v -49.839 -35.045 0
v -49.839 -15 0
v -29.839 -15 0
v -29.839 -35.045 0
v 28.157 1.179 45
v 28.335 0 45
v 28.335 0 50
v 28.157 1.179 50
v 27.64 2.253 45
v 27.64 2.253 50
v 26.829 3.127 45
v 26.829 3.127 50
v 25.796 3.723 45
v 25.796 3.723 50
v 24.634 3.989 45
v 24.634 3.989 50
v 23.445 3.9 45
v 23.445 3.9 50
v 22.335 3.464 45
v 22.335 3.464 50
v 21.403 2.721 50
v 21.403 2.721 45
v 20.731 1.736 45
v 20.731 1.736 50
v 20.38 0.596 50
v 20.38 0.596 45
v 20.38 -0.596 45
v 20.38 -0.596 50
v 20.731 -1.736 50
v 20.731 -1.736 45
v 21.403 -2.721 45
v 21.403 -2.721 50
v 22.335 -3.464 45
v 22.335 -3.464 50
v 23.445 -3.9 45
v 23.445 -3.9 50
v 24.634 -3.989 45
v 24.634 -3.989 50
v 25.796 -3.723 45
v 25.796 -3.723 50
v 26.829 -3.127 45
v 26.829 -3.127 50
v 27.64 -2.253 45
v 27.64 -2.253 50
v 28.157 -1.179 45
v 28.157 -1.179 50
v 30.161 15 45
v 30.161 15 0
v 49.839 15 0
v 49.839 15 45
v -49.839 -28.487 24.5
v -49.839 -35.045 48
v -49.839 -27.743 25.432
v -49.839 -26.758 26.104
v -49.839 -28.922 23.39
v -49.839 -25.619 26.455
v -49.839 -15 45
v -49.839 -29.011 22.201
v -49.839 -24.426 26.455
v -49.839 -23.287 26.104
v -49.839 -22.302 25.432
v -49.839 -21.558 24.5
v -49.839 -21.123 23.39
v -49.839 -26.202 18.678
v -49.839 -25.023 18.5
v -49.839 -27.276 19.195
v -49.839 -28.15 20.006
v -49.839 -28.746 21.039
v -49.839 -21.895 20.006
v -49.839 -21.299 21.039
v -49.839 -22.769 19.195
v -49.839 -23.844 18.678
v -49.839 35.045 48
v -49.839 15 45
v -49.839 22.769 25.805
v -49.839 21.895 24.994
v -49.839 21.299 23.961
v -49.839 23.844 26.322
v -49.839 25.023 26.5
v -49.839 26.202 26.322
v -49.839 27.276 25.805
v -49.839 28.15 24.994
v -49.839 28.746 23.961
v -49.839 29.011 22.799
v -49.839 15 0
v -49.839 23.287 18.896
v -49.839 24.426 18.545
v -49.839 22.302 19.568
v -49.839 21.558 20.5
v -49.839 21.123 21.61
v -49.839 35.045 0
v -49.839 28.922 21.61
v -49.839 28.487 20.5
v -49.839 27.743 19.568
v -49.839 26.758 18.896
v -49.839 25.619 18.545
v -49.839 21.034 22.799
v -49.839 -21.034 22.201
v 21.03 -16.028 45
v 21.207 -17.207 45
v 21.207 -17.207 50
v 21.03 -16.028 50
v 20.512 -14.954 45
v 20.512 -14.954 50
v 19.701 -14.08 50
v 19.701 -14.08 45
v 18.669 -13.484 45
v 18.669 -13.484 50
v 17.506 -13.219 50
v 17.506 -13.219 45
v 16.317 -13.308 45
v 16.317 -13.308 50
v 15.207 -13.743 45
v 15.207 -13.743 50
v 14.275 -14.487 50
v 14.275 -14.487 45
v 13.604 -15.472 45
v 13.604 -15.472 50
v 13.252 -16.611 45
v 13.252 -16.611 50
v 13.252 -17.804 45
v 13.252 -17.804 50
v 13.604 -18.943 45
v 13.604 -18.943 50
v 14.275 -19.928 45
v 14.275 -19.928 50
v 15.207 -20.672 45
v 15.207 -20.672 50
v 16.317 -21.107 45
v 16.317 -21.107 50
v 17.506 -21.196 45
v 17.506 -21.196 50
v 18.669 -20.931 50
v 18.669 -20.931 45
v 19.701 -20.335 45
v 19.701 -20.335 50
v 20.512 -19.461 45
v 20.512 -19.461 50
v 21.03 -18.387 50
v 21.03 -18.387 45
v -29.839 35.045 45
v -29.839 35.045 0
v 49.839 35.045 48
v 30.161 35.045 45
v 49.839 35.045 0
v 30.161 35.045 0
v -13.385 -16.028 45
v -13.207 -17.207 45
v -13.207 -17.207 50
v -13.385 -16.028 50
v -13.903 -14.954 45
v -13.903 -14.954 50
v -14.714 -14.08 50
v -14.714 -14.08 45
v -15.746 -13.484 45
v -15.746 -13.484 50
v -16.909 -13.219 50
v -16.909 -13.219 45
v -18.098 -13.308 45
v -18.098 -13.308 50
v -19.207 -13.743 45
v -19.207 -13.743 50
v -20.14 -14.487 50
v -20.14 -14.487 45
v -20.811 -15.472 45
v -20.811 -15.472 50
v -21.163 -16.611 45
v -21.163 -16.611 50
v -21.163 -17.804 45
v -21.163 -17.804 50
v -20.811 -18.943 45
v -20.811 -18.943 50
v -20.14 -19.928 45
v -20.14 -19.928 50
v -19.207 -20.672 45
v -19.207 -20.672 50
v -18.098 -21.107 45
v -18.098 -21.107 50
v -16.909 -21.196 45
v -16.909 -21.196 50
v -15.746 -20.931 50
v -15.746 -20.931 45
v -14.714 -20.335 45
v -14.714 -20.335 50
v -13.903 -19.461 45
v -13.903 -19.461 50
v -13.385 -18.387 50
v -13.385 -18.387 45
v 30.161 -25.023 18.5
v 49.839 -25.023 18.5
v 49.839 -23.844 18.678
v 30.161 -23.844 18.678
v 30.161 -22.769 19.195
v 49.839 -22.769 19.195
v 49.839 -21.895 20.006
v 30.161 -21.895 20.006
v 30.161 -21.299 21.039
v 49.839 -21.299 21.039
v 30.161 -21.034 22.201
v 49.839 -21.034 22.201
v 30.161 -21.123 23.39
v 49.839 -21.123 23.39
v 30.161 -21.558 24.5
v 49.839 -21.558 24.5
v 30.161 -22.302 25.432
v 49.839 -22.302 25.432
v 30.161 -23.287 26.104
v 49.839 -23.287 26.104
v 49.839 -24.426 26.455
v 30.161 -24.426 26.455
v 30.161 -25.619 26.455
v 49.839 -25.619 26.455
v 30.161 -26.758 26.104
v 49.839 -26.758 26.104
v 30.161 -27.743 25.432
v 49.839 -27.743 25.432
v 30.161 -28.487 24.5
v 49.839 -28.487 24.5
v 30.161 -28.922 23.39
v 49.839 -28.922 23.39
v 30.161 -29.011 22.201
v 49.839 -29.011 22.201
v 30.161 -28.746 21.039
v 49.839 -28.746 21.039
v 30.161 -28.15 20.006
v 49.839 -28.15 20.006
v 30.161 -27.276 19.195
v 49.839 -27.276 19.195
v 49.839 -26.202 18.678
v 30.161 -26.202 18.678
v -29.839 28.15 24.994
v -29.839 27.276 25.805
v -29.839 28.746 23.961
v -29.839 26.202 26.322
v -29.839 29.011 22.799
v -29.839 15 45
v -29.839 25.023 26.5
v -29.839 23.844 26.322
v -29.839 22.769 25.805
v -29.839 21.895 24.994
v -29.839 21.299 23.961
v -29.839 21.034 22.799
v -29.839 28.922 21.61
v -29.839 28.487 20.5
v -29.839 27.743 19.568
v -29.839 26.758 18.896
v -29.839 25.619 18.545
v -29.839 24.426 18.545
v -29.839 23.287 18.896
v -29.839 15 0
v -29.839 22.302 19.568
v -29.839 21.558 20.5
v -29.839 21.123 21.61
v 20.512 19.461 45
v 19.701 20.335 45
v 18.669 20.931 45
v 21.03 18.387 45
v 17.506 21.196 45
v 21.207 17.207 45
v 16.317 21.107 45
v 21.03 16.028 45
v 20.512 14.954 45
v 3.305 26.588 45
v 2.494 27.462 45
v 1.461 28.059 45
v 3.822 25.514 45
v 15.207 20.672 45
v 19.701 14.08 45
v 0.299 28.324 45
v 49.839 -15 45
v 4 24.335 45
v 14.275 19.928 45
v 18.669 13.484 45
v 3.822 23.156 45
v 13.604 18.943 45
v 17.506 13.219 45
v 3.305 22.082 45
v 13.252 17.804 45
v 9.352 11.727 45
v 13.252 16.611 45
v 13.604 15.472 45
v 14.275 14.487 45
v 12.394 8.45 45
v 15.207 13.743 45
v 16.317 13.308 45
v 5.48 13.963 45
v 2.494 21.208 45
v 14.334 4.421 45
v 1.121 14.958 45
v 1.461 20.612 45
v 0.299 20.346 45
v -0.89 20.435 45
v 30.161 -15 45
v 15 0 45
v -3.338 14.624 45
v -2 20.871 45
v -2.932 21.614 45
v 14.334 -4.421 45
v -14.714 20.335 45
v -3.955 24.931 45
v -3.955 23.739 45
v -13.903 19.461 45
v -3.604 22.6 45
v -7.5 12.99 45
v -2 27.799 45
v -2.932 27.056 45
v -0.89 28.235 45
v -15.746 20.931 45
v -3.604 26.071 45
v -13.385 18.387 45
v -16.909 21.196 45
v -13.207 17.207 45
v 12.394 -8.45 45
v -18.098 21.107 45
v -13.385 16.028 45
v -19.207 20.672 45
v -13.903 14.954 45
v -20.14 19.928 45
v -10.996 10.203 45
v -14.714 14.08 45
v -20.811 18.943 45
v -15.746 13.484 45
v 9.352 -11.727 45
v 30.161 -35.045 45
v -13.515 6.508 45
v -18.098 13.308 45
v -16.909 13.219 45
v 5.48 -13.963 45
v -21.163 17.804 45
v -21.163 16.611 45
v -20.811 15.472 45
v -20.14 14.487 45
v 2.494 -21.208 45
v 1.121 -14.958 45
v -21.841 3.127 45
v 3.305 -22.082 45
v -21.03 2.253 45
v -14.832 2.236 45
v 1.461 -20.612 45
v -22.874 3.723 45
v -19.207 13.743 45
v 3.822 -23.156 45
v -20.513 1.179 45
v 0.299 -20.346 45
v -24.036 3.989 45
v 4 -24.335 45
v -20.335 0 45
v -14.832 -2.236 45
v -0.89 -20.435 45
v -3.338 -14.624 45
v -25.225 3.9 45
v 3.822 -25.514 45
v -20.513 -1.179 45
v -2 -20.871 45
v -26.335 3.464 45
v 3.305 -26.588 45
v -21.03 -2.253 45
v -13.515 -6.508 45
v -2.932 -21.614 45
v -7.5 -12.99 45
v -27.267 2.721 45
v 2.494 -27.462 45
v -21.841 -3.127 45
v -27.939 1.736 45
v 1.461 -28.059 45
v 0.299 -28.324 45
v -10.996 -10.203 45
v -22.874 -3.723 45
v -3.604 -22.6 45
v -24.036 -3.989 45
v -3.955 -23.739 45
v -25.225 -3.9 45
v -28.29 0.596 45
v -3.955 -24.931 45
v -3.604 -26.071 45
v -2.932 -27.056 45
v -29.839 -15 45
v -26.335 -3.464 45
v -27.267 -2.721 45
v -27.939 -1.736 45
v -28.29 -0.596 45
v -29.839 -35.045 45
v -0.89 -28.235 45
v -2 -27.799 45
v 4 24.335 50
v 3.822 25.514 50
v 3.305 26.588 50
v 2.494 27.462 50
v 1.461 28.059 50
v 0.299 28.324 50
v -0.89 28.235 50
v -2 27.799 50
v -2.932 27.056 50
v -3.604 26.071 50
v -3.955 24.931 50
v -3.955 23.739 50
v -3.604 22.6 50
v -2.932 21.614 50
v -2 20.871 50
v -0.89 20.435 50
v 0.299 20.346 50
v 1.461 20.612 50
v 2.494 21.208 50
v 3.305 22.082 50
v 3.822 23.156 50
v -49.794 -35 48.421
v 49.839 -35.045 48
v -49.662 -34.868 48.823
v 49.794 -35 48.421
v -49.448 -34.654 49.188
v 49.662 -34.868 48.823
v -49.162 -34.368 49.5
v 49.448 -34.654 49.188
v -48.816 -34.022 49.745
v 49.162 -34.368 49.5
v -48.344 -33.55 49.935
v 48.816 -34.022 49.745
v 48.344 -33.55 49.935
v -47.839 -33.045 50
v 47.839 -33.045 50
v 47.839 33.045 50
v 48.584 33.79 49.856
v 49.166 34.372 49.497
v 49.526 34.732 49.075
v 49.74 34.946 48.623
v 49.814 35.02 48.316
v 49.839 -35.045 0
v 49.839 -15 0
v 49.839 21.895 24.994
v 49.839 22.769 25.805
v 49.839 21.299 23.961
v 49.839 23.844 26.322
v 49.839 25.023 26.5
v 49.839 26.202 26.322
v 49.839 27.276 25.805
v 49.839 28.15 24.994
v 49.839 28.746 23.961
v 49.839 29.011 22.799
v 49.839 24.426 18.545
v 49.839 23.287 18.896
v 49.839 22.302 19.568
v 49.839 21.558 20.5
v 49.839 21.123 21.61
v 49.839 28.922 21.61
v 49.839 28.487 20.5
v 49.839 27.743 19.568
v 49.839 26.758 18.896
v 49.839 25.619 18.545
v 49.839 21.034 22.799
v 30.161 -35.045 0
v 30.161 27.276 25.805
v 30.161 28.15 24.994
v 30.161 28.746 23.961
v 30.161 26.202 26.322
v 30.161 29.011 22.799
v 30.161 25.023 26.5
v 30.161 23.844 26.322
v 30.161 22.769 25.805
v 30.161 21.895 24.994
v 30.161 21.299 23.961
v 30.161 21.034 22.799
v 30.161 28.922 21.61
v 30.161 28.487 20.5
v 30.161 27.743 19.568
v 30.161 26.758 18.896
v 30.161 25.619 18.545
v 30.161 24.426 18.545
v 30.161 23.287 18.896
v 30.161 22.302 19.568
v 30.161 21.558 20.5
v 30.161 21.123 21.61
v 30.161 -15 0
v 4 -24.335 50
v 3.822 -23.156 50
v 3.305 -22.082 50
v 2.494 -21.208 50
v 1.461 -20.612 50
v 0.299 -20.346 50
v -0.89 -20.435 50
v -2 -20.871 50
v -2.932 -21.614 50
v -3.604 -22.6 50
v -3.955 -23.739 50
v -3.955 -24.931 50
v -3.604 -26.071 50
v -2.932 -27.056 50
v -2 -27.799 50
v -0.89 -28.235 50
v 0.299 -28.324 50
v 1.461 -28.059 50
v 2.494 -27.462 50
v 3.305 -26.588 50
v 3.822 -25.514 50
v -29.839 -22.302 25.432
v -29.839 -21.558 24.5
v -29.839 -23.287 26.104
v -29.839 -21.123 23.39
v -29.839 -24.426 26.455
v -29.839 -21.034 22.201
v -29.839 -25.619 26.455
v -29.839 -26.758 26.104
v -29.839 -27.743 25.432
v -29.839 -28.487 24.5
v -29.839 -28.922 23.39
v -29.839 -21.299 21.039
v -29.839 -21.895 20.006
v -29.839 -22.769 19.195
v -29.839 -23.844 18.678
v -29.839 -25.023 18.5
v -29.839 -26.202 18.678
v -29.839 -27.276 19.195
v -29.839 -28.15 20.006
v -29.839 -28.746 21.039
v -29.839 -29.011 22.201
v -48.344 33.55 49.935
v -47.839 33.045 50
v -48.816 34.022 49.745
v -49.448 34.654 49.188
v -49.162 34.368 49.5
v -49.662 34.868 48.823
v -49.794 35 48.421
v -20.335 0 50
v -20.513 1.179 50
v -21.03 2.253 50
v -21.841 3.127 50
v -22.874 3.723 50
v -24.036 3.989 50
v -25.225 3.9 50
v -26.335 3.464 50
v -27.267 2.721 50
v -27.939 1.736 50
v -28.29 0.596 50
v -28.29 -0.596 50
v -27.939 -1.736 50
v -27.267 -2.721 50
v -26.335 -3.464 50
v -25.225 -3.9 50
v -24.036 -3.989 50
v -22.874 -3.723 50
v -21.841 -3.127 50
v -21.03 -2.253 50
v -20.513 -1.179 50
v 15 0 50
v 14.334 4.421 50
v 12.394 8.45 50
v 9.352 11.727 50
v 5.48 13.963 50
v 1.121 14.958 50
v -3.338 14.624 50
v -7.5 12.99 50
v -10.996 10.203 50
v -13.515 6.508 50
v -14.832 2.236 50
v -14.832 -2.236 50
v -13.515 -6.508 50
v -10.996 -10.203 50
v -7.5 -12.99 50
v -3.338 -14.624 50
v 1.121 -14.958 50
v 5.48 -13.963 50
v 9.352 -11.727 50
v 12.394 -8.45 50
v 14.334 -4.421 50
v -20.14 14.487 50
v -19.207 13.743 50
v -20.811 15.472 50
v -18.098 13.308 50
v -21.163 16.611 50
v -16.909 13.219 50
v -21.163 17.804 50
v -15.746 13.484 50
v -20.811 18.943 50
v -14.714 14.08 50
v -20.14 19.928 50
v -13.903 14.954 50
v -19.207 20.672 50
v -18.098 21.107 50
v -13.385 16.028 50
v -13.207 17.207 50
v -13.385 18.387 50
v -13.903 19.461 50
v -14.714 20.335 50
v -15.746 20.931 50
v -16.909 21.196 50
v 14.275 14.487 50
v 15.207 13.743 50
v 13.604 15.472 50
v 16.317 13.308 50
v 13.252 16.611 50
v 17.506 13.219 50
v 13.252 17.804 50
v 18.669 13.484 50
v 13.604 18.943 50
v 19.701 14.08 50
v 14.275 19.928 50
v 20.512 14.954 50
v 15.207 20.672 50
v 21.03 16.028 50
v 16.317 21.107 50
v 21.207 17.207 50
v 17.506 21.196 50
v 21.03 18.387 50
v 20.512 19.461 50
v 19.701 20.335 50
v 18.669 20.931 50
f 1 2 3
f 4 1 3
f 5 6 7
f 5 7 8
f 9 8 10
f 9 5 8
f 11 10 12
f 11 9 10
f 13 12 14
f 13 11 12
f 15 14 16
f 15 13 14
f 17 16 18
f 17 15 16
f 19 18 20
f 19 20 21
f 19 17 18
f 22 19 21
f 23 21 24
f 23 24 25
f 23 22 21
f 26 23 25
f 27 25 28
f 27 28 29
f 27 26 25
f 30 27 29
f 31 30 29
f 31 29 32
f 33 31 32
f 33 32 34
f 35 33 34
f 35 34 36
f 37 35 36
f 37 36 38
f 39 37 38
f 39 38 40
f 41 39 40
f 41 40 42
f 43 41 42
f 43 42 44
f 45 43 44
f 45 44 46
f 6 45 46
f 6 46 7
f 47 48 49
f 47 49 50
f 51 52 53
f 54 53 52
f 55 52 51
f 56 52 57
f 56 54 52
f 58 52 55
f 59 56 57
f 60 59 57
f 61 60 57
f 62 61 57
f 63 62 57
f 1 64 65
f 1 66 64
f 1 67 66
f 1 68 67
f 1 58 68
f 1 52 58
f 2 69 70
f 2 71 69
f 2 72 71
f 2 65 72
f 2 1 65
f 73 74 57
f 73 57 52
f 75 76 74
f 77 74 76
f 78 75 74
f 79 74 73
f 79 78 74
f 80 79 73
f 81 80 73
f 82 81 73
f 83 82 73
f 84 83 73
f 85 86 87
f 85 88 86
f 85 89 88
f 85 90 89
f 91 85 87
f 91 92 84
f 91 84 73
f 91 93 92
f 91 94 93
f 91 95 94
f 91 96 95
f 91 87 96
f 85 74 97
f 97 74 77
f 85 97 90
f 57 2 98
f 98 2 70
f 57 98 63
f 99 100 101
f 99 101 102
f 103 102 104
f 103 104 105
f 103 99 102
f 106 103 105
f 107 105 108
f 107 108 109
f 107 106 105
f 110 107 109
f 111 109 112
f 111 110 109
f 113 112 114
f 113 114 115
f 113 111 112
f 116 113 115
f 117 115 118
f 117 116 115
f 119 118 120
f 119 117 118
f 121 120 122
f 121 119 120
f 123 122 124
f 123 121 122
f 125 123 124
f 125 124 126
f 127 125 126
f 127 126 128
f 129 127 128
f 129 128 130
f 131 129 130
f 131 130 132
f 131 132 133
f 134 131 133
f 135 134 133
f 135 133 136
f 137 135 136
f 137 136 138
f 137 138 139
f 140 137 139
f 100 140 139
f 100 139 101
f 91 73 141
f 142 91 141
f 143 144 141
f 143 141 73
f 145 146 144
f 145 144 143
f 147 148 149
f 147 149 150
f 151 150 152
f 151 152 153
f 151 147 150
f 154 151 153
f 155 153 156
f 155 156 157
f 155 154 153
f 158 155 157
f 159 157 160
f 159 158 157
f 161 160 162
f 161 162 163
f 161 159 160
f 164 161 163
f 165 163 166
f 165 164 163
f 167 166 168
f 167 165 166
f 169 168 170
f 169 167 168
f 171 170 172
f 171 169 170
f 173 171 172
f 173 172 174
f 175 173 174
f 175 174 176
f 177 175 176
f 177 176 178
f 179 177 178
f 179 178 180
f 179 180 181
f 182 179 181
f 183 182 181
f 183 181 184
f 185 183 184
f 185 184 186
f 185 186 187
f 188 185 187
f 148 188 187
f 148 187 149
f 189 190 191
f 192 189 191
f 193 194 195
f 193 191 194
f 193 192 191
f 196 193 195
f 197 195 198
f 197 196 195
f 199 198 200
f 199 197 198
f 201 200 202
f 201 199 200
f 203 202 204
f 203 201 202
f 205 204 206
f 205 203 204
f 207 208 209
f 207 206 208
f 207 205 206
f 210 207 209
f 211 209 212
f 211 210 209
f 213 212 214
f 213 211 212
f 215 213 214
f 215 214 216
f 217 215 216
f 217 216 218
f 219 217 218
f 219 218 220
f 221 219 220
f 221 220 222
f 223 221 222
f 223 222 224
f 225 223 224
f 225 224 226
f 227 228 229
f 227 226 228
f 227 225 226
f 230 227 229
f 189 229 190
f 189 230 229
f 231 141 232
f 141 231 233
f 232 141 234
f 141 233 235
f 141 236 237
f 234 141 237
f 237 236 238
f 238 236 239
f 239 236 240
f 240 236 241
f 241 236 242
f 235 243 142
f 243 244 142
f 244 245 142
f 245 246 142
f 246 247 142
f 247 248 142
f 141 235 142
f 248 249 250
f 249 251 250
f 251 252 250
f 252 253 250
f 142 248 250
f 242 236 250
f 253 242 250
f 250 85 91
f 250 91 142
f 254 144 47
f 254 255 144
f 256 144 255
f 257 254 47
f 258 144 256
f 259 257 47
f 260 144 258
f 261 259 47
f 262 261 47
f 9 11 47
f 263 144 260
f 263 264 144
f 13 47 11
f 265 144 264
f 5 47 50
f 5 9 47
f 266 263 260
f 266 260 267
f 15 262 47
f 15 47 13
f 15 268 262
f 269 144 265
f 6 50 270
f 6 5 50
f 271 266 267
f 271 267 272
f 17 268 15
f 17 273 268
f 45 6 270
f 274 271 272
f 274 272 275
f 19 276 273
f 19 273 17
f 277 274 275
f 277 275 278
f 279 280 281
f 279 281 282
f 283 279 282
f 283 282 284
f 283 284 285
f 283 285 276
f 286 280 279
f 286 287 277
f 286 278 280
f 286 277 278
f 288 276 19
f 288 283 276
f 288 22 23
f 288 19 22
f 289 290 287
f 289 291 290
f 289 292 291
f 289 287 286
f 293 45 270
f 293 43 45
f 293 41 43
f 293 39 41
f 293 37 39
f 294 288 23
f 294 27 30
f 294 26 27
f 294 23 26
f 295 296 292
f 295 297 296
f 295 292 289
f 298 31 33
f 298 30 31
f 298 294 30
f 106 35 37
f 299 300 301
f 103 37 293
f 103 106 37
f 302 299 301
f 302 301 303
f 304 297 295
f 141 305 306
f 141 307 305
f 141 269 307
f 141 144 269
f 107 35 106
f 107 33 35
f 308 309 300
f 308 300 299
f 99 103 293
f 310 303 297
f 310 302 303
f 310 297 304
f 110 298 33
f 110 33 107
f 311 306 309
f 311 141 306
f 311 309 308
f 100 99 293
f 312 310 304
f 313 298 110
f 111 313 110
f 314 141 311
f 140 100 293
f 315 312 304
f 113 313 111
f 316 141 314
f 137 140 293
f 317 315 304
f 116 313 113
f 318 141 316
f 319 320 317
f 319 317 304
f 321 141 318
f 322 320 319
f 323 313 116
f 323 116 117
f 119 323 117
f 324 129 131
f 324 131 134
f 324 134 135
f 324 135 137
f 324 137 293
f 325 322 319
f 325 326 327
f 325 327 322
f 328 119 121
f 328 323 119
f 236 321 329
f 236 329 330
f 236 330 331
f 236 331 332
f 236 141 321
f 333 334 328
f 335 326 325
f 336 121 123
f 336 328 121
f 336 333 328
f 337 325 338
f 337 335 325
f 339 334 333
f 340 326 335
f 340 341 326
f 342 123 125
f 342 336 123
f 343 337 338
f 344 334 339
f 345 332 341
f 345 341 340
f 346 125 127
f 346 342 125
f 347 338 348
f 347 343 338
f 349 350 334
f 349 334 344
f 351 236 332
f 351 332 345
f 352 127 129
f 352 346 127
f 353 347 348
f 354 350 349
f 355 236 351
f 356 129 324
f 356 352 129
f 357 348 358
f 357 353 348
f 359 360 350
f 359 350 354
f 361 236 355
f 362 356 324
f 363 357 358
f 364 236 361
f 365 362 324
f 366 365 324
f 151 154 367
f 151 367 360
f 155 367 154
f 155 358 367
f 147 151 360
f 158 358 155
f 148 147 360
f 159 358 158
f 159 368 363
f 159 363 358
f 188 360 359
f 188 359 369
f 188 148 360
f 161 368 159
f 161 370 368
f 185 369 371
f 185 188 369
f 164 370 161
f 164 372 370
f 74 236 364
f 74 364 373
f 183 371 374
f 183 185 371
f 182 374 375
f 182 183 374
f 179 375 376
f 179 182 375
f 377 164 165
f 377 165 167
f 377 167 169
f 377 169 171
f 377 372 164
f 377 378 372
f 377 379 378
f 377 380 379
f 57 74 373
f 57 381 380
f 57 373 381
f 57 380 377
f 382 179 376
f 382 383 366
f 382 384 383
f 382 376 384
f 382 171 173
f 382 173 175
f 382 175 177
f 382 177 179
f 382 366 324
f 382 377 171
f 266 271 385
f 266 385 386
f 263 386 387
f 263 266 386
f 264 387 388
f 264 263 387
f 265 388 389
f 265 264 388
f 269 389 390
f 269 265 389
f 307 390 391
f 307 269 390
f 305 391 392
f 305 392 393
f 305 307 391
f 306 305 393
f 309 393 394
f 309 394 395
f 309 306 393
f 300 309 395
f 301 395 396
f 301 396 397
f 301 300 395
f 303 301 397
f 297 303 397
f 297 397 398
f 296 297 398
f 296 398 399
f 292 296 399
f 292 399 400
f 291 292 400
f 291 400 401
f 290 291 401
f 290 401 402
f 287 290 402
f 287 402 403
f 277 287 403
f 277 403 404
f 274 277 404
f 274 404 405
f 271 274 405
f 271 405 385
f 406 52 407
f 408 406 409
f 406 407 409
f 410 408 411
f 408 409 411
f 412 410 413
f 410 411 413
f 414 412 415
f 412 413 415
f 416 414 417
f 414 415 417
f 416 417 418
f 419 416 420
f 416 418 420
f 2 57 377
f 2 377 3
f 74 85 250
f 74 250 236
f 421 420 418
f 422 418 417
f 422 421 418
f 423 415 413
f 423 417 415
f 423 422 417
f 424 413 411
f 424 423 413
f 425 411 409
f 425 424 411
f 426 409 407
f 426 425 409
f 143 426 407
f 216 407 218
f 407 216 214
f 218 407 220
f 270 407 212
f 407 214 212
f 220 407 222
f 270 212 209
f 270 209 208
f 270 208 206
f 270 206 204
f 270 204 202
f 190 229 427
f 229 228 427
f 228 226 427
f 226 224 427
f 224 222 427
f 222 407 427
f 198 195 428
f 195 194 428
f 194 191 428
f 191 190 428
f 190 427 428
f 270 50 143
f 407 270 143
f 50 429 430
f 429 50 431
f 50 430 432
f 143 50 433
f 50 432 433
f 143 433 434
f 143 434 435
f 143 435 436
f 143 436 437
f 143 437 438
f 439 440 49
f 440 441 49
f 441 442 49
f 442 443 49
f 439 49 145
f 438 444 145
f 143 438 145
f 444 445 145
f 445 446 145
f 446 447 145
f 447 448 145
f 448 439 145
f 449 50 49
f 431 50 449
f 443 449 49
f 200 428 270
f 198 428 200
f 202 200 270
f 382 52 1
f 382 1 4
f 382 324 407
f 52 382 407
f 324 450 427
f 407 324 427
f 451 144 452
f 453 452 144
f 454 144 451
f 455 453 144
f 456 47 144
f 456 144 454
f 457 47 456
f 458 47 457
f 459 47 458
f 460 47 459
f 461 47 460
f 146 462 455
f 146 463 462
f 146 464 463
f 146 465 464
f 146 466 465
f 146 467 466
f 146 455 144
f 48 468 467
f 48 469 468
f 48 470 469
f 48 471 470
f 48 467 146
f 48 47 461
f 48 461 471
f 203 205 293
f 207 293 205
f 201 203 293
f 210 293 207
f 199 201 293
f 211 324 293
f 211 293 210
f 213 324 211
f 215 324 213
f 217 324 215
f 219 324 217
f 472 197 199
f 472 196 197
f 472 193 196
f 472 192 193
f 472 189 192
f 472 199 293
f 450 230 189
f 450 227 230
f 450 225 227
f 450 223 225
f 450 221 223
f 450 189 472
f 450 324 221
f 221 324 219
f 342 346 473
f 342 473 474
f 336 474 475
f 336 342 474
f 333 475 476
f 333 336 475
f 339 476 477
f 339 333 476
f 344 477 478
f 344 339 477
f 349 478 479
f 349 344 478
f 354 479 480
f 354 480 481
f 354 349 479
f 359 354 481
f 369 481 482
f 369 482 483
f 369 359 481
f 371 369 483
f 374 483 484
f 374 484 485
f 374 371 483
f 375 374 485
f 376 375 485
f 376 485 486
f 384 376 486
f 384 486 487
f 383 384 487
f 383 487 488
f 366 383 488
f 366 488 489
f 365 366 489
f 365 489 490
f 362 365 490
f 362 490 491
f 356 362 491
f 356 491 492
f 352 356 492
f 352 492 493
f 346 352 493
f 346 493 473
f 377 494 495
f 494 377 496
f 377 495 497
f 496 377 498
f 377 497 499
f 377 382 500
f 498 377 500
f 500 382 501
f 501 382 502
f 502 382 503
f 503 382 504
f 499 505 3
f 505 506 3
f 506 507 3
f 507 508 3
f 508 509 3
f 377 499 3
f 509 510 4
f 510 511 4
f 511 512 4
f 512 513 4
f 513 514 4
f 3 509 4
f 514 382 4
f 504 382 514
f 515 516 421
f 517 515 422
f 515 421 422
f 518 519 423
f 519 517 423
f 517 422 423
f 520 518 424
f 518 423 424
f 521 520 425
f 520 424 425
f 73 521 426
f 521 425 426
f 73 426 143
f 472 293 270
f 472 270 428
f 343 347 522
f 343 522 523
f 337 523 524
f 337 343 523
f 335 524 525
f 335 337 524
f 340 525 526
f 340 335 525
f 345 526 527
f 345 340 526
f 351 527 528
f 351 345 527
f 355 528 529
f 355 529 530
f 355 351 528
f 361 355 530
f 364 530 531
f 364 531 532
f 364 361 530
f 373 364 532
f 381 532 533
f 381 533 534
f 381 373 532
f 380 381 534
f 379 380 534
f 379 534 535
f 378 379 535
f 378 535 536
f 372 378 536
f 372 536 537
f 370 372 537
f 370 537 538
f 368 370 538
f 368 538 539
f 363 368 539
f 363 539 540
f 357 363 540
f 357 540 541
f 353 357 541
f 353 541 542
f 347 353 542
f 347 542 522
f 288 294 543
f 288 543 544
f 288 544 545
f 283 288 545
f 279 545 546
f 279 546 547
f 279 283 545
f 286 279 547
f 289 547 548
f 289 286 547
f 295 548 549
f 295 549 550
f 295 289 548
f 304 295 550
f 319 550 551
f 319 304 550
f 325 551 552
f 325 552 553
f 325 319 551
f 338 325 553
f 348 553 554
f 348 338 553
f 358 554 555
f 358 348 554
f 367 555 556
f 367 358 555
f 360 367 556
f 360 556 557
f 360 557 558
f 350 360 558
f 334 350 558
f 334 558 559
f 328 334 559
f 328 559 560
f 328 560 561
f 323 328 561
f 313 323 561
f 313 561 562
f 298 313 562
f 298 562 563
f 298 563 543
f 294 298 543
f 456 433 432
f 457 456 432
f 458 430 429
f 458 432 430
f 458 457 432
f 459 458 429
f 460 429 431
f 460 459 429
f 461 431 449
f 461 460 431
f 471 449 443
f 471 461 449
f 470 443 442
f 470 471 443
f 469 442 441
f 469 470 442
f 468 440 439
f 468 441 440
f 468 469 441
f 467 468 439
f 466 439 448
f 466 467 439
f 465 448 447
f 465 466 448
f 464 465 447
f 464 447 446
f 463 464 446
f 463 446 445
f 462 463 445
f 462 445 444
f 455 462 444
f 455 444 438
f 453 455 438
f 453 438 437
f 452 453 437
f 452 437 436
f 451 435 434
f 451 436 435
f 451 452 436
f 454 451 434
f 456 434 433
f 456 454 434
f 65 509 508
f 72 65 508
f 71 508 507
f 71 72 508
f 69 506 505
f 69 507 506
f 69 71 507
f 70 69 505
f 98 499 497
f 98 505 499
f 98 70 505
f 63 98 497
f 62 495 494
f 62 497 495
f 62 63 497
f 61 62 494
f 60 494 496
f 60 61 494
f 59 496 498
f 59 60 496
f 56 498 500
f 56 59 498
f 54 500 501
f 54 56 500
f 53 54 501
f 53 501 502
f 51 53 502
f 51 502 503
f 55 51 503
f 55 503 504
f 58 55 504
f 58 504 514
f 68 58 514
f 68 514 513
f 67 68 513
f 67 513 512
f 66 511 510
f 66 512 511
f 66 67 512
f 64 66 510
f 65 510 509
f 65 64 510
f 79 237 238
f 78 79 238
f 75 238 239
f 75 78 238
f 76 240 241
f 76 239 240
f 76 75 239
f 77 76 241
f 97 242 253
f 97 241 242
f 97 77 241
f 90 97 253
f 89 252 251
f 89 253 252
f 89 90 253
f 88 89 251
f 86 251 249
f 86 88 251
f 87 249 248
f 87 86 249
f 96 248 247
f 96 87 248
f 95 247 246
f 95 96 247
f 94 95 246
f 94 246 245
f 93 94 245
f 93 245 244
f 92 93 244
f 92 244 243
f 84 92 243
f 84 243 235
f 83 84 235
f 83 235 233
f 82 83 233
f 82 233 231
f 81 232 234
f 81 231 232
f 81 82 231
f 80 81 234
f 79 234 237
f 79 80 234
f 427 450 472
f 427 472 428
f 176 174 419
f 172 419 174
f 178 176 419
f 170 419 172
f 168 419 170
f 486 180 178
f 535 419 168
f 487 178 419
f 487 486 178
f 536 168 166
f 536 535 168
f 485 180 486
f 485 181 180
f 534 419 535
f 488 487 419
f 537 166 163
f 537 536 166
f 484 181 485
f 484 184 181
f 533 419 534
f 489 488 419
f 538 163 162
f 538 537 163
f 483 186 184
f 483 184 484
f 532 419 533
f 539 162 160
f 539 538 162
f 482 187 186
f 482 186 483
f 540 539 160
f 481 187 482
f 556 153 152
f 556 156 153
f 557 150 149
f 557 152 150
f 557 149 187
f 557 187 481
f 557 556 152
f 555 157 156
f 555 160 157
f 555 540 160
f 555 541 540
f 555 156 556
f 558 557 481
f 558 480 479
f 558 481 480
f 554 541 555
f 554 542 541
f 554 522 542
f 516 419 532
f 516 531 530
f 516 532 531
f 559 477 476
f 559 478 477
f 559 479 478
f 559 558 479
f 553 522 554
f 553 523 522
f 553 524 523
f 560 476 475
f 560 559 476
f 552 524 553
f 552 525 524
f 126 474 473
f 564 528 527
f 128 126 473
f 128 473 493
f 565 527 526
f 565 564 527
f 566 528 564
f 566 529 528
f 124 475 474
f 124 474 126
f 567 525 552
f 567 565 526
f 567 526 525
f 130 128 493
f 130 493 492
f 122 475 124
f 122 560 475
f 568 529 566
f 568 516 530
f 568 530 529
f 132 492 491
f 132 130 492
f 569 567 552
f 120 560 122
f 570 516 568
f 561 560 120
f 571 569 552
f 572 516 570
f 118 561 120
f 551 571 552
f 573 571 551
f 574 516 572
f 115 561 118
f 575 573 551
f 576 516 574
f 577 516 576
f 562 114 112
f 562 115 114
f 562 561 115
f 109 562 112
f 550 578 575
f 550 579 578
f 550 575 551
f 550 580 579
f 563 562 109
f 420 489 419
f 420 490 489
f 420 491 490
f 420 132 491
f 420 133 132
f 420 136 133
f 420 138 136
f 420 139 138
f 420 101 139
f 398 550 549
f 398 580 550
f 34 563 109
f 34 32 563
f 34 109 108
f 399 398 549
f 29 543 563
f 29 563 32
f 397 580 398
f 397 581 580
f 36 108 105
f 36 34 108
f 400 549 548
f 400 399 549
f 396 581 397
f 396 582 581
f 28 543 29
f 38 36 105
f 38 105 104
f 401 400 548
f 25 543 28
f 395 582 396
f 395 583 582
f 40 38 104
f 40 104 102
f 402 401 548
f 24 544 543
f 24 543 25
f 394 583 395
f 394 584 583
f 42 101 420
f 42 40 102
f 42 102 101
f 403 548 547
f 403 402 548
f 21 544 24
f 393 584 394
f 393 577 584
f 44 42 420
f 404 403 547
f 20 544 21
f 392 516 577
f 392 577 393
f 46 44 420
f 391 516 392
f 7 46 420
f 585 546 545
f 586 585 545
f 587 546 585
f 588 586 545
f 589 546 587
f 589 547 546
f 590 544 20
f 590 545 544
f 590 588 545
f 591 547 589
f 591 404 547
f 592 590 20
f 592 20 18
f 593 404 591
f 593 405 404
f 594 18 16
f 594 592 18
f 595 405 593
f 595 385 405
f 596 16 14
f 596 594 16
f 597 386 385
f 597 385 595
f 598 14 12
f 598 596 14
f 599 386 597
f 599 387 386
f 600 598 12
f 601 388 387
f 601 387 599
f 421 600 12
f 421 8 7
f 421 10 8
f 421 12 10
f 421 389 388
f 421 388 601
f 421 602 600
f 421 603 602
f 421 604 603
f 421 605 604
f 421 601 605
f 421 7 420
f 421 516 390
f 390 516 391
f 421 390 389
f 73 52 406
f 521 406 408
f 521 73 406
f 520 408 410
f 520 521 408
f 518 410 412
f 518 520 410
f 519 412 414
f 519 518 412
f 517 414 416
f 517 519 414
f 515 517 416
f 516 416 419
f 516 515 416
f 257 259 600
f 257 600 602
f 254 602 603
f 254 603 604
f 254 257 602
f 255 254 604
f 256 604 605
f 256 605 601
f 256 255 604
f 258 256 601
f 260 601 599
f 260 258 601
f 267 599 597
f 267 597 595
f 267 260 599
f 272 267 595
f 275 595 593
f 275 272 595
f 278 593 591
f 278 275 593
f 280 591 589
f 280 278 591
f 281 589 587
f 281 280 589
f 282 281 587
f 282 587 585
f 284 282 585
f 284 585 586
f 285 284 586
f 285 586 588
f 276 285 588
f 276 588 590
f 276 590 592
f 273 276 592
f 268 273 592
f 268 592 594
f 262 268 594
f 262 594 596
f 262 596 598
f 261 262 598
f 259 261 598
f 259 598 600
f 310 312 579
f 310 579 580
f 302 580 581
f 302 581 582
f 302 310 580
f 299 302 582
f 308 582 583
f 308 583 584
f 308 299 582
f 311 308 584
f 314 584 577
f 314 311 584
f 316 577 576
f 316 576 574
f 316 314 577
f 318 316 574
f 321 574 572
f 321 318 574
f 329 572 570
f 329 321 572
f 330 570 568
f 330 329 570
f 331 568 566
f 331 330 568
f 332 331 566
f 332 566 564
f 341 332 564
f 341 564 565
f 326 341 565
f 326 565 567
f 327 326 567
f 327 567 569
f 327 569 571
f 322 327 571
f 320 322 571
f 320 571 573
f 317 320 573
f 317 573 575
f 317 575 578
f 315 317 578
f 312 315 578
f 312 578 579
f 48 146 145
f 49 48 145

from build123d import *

# Parameters (mm, degrees)
ESBO_O1_W                  = 99.678448554
ESBO_O1_H                  = 70.090169096
ESBO_O1_R                  = 15
ESBO_O1_R_2                = 4
RESSALTO_EXTRUS_O1_DEPTH   = 50
CORTE_EXTRUS_O1_DEPTH      = 79.816915872
CORTE_EXTRUS_O1_DEPTH_BACK = 79.816915872
ESBO_O2_W                  = 60
ESBO_O2_H                  = 45
CORTE_EXTRUS_O2_DEPTH      = 79.816915872
CORTE_EXTRUS_O2_DEPTH_BACK = 79.816915872
CORTE_EXTRUS_O4_DEPTH      = 79.816915872
CORTE_EXTRUS_O4_DEPTH_BACK = 79.816915872
ESBO_O4_R                  = 4
FILETE4_R                  = 2


with BuildPart() as part:
    # Esboço1 → Ressalto-extrusão1 (new body)
    with BuildSketch(Plane.XY):
        Rectangle(ESBO_O1_W, ESBO_O1_H)
        Circle(ESBO_O1_R, mode=Mode.SUBTRACT)
        with Locations((24.33507008, 0)):
            Circle(ESBO_O1_R_2, mode=Mode.SUBTRACT)
        with Locations((17.207493074, -17.207493074)):
            Circle(ESBO_O1_R_2, mode=Mode.SUBTRACT)
        with Locations((0, -24.33507008)):
            Circle(ESBO_O1_R_2, mode=Mode.SUBTRACT)
        with Locations((-17.207493074, -17.207493074)):
            Circle(ESBO_O1_R_2, mode=Mode.SUBTRACT)
        with Locations((-24.33507008, 0)):
            Circle(ESBO_O1_R_2, mode=Mode.SUBTRACT)
        with Locations((-17.207493074, 17.207493074)):
            Circle(ESBO_O1_R_2, mode=Mode.SUBTRACT)
        with Locations((0, 24.33507008)):
            Circle(ESBO_O1_R_2, mode=Mode.SUBTRACT)
        with Locations((17.207493074, 17.207493074)):
            Circle(ESBO_O1_R_2, mode=Mode.SUBTRACT)
    extrude(amount=RESSALTO_EXTRUS_O1_DEPTH)

    # Esboço2 → Corte-extrusão1 (cut, two sides: drawn at the far end of the back side and taken through both)
    with BuildSketch(Plane(origin=(0, 0, 0), x_dir=(1, 0, 0), z_dir=(0, 1, 0)).offset(-CORTE_EXTRUS_O1_DEPTH_BACK)):
        with Locations((0.160775723, -22.5)):
            Rectangle(ESBO_O2_W, ESBO_O2_H)
    extrude(amount=CORTE_EXTRUS_O1_DEPTH + CORTE_EXTRUS_O1_DEPTH_BACK, mode=Mode.SUBTRACT)

    # Esboço3 → Corte-extrusão2 (cut, two sides: drawn at the far end of the back side and taken through both)
    with BuildSketch(Plane(origin=(0, 0, 0), x_dir=(0, 0, -1), z_dir=(1, 0, 0)).offset(-CORTE_EXTRUS_O2_DEPTH_BACK)):
        Polygon((0, 0), (0, 15), (-45, 15), (-45, -15), (0, -15), align=None)
    extrude(amount=CORTE_EXTRUS_O2_DEPTH + CORTE_EXTRUS_O2_DEPTH_BACK, mode=Mode.SUBTRACT)

    # Esboço4 → Corte-extrusão4 (cut, two sides: drawn at the far end of the back side and taken through both)
    with BuildSketch(Plane(origin=(0, 0, 0), x_dir=(0, 0, -1), z_dir=(1, 0, 0)).offset(-CORTE_EXTRUS_O4_DEPTH_BACK)):
        with Locations((-22.5, -25.022542274)):
            Circle(ESBO_O4_R)
        with Locations(Location((-22.5, 25.022542274, 0), (0, 0, 180))):
            Circle(ESBO_O4_R)
    extrude(amount=CORTE_EXTRUS_O4_DEPTH + CORTE_EXTRUS_O4_DEPTH_BACK, mode=Mode.SUBTRACT)

    # Filete4
    filete4_edges = [part.edges().sort_by_distance(p)[0] for p in [
        (-49.839224277, 0, 50),
        (0, -35.045084548, 50),
        (49.839224277, 0, 50),
        (0, 35.045084548, 50),
    ]]
    fillet(filete4_edges, radius=FILETE4_R)


solid = part.part
